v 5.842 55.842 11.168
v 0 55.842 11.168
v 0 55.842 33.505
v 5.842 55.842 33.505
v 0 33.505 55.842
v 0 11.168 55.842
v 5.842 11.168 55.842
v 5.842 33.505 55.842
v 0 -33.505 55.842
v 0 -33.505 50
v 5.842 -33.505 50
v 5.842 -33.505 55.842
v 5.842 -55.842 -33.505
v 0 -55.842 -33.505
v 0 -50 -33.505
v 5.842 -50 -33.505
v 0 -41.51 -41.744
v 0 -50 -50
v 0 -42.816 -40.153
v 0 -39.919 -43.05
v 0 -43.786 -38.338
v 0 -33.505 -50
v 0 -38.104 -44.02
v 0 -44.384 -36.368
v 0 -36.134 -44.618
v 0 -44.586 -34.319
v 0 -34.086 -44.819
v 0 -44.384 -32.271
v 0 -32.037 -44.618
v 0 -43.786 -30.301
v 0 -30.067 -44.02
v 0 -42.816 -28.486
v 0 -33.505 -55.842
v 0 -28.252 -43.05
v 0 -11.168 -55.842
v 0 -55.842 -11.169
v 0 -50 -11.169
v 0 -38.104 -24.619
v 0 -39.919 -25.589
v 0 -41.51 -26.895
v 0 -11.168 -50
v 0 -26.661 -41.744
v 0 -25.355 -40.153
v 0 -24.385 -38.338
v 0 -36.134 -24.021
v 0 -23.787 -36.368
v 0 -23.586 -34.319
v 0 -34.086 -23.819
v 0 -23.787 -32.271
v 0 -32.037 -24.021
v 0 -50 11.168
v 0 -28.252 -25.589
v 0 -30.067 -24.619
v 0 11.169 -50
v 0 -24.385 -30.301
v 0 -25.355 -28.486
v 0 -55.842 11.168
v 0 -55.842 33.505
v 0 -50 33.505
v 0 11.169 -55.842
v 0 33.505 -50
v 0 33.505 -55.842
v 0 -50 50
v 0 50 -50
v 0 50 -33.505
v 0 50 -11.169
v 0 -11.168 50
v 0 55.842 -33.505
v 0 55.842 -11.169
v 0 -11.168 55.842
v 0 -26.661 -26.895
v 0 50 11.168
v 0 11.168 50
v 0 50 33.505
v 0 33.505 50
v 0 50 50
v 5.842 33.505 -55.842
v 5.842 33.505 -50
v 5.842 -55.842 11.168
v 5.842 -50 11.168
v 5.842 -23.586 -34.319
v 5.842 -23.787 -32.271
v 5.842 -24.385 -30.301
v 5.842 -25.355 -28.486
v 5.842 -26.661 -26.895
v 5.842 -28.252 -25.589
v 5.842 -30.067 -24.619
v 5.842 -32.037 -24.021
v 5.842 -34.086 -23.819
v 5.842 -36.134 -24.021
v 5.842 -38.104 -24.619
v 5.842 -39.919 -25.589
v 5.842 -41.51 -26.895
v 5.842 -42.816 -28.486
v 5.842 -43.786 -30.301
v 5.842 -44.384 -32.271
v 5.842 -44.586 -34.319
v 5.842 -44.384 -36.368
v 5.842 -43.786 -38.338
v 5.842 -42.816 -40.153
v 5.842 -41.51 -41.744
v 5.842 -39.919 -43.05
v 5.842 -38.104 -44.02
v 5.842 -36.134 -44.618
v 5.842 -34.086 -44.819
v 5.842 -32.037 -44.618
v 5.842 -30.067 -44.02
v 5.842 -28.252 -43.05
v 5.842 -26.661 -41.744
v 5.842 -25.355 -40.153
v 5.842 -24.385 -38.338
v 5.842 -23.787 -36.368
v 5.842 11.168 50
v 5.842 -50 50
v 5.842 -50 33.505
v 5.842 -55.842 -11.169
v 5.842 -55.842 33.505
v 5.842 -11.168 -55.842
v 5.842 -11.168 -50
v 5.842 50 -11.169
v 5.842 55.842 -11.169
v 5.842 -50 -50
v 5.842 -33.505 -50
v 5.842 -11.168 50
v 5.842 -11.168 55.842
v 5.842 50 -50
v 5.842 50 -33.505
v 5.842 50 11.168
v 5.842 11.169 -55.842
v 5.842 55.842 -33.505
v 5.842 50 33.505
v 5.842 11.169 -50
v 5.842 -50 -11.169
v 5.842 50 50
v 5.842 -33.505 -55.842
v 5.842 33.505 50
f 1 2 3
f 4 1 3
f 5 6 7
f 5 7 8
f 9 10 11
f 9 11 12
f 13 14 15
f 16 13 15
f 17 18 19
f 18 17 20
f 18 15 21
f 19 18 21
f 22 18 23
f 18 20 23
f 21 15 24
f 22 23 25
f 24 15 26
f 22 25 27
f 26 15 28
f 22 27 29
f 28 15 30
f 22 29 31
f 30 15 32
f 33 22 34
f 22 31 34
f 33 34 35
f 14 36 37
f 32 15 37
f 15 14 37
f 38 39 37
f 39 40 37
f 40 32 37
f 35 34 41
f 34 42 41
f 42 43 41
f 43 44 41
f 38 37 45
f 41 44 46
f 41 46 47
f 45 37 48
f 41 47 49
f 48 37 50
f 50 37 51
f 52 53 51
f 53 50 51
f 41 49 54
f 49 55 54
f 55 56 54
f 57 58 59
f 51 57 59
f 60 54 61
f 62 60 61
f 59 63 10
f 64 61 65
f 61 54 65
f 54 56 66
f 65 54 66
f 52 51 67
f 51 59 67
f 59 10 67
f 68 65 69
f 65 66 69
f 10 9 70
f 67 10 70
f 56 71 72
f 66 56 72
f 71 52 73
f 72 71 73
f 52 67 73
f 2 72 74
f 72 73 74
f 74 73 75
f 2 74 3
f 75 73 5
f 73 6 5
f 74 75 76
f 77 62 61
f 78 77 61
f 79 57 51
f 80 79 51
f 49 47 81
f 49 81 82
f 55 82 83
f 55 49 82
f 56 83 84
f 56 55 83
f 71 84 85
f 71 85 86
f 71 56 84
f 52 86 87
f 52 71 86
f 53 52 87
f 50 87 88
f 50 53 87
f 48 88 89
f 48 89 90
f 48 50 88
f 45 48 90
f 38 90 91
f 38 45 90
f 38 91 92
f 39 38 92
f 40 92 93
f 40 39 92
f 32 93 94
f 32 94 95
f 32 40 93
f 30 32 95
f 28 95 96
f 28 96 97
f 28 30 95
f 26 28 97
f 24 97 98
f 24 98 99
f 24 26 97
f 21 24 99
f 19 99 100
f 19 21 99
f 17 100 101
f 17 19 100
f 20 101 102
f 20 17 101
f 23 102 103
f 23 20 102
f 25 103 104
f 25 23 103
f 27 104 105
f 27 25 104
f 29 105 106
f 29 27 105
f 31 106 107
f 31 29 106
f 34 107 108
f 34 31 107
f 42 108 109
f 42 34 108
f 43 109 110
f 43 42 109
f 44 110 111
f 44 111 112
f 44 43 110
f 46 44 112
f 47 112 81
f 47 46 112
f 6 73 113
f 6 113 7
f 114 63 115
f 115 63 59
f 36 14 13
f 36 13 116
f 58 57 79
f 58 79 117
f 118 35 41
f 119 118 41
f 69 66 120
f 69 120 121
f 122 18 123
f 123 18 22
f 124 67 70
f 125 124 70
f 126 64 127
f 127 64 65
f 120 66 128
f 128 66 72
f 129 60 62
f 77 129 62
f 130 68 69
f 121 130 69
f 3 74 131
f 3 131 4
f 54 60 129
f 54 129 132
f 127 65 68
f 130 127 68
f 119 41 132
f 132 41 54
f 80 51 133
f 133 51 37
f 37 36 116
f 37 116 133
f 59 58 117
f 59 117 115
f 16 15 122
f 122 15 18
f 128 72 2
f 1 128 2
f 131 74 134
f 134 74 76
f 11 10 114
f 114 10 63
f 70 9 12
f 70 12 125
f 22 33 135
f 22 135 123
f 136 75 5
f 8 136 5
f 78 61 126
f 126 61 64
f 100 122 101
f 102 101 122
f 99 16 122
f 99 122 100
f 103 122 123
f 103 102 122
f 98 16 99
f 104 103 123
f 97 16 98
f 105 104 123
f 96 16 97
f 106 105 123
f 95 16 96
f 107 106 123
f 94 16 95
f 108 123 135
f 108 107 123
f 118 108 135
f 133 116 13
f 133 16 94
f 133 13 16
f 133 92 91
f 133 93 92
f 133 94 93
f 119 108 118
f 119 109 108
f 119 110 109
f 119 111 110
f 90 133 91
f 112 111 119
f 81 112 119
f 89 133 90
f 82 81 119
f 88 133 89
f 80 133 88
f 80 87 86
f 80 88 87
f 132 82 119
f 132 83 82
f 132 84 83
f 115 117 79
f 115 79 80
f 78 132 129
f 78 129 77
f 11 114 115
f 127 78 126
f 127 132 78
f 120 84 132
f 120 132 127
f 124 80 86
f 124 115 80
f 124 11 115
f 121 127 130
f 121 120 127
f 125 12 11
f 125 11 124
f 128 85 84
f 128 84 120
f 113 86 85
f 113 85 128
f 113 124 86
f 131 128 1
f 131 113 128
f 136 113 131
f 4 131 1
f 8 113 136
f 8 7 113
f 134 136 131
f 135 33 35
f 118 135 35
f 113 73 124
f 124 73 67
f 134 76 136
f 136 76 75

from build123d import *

# Parameters (mm, degrees)
F0_R     = 10.5
F0_W     = 22.3368
F0_H     = 5.842
F0_W_2   = 5.842
F0_H_2   = 22.337
F0_H_3   = 22.3366
F0_W_3   = 22.337
F0_W_4   = 22.3366
F1_DEPTH = 5.842


with BuildPart() as f1:
    # F0 (on Right) → F1 (new body)
    with BuildSketch(Plane.YZ):
        Polygon((-33.5052, 50), (-50, 50), (-50, 33.5052), (-50, 11.1682), (-50, -11.1686), (-50, -33.5052), (-50, -50), (-33.5052, -50), (-11.1682, -50), (11.1686, -50), (33.5052, -50), (50, -50), (50, -33.5052), (50, -11.1686), (50, 11.1682), (50, 33.5052), (50, 50), (33.5052, 50), (11.1684, 50), (-11.1684, 50), align=None)
        with Locations((-34.085574, -34.319336)):
            Circle(F0_R, mode=Mode.SUBTRACT)
        with Locations((-22.3368, 52.921)):
            Rectangle(F0_W, F0_H)
        with Locations((-52.921, 22.3367)):
            Rectangle(F0_W_2, F0_H_2)
        with Locations((22.3368, 52.921)):
            Rectangle(F0_W, F0_H)
        with Locations((-52.921, -22.3369)):
            Rectangle(F0_W_2, F0_H_3)
        with Locations((52.921, 22.3367)):
            Rectangle(F0_W_2, F0_H_2)
        with Locations((-22.3367, -52.921)):
            Rectangle(F0_W_3, F0_H)
        with Locations((52.921, -22.3369)):
            Rectangle(F0_W_2, F0_H_3)
        with Locations((22.3369, -52.921)):
            Rectangle(F0_W_4, F0_H)
    extrude(amount=F1_DEPTH)


solid = f1.part
